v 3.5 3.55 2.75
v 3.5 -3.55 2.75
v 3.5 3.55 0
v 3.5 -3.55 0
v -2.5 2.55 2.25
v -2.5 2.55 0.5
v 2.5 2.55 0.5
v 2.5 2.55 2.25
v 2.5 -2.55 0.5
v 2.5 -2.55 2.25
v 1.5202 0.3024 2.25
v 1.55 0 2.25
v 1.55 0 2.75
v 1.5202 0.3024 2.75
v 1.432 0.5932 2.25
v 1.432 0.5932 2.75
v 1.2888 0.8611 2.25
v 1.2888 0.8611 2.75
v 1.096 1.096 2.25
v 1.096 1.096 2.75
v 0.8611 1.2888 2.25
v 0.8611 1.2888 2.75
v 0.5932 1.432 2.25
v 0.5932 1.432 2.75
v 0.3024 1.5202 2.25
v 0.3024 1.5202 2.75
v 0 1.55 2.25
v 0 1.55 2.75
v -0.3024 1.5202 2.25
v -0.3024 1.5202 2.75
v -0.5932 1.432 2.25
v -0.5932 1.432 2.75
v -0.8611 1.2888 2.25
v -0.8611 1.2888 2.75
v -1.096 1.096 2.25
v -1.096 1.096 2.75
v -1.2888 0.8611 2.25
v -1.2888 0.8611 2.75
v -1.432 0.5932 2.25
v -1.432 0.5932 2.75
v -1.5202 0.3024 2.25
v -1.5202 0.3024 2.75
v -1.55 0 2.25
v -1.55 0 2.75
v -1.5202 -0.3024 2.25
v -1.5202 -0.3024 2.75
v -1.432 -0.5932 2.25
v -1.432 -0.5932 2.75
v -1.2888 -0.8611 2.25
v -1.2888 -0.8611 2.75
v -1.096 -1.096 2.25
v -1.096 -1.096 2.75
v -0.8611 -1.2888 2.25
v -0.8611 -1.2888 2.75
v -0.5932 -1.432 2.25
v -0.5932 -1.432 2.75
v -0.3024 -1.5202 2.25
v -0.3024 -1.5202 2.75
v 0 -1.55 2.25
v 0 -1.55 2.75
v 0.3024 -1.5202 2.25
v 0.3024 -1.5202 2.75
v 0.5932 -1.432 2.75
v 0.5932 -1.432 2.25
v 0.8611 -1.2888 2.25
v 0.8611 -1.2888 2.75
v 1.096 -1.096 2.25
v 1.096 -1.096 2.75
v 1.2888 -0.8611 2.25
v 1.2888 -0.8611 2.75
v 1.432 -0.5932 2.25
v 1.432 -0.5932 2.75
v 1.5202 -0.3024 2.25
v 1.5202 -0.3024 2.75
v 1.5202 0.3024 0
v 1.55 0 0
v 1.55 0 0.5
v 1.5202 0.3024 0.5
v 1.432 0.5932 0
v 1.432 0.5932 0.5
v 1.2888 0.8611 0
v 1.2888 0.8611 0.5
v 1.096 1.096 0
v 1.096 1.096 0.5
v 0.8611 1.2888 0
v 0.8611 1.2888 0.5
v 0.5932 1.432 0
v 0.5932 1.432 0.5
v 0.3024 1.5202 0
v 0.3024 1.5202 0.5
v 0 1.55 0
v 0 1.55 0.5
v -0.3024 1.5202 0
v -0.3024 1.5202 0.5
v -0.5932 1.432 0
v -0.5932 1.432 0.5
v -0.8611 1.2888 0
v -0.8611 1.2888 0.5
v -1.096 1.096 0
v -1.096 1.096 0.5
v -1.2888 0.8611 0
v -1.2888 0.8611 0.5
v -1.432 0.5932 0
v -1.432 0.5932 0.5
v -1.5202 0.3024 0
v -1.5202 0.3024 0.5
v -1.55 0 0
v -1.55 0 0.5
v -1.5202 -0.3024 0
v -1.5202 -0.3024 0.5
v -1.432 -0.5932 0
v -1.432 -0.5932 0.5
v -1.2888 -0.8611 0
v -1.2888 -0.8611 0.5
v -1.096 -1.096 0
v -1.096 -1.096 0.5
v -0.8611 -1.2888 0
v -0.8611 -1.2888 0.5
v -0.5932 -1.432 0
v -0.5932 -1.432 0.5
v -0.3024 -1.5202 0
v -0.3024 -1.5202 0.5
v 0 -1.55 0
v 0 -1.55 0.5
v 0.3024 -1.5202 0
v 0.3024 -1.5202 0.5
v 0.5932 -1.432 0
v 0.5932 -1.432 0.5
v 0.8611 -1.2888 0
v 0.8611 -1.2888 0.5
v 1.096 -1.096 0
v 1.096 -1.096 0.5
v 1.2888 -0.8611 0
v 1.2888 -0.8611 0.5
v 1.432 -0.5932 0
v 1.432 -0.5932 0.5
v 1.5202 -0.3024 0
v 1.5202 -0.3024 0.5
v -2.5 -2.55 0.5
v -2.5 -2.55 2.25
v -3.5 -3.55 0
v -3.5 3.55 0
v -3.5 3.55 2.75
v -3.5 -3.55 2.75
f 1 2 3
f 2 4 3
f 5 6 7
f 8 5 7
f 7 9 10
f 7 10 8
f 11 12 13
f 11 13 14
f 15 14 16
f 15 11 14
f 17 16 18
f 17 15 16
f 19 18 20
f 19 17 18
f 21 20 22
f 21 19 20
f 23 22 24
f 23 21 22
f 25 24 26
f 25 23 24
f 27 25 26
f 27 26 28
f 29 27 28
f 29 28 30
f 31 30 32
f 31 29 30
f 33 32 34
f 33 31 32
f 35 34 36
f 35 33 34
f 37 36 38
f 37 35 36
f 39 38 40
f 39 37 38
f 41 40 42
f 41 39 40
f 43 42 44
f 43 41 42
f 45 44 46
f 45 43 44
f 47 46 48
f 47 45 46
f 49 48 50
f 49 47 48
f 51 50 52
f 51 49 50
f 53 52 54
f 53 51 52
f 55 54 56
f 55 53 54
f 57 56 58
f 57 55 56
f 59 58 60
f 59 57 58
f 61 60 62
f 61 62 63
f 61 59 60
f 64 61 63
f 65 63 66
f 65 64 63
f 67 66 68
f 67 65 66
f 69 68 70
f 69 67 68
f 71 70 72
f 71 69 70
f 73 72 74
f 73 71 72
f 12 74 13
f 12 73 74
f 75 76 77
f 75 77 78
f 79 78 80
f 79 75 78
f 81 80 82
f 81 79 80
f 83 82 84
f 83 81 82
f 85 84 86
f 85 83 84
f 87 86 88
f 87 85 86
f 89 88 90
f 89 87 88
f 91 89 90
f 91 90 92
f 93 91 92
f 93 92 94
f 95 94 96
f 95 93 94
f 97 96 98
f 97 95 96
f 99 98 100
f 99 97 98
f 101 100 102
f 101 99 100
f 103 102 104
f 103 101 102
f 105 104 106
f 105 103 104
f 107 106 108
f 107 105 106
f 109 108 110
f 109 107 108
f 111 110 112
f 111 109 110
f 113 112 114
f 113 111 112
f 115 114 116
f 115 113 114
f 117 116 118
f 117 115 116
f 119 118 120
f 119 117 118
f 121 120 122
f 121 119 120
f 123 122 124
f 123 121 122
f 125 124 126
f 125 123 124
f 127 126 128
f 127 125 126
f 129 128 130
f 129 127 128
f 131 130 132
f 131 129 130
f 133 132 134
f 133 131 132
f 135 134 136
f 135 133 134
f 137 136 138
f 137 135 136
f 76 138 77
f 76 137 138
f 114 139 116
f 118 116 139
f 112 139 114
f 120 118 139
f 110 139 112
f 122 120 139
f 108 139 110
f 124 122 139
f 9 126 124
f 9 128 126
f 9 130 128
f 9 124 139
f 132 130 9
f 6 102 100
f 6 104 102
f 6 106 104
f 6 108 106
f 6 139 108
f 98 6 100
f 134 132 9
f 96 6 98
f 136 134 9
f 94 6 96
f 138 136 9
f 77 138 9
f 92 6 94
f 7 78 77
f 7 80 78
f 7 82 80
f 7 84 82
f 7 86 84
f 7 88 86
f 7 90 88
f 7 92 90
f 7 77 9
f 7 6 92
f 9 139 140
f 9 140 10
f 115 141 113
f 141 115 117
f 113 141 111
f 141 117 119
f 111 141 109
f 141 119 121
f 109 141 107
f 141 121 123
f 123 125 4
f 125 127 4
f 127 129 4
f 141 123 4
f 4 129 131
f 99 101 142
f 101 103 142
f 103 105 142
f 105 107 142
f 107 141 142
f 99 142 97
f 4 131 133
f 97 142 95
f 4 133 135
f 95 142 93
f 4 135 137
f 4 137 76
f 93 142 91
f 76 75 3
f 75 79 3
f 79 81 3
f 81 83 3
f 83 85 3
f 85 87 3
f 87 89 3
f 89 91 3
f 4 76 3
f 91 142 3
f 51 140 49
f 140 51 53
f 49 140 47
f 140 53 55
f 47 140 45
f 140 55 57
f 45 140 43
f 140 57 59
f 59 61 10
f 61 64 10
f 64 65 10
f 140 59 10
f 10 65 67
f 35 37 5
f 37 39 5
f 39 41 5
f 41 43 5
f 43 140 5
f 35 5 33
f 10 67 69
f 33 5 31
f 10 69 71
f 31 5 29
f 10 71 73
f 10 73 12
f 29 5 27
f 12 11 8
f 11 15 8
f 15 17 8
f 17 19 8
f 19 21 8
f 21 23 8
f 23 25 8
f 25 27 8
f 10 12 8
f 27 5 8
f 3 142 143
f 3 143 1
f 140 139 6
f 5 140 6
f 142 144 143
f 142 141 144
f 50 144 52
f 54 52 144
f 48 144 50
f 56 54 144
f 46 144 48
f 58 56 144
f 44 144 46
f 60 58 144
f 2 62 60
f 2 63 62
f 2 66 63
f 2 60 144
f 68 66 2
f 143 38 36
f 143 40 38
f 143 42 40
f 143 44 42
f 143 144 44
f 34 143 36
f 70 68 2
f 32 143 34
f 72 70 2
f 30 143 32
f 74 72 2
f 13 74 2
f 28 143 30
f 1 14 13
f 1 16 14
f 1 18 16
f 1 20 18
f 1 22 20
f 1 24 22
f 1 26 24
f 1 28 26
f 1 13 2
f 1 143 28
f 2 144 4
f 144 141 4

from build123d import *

# Parameters (mm, degrees)
F0_W     = 7
F0_H     = 7.1
F0_R     = 1.55
F1_DEPTH = 0.5
F2_W     = 7
F2_H     = 7.1
F2_W_2   = 5
F2_H_2   = 5.1
F3_DEPTH = 1.75
F4_W     = 7
F4_H     = 7.1
F4_R     = 1.55
F5_DEPTH = 0.5


with BuildPart() as f1:
    # F0 (on Top) → F1 (new body)
    with BuildSketch(Plane.XY):
        Rectangle(F0_W, F0_H)
        Circle(F0_R, mode=Mode.SUBTRACT)
    extrude(amount=F1_DEPTH)

    # F2 (on face) → F3 (join)
    with BuildSketch(Plane.XY.offset(0.5)):
        Rectangle(F2_W, F2_H)
        Rectangle(F2_W_2, F2_H_2, mode=Mode.SUBTRACT)
    extrude(amount=F3_DEPTH)

    # F4 (on face) → F5 (join)
    with BuildSketch(Plane.XY.offset(2.25)):
        Rectangle(F4_W, F4_H)
        Circle(F4_R, mode=Mode.SUBTRACT)
    extrude(amount=F5_DEPTH)


solid = f1.part
